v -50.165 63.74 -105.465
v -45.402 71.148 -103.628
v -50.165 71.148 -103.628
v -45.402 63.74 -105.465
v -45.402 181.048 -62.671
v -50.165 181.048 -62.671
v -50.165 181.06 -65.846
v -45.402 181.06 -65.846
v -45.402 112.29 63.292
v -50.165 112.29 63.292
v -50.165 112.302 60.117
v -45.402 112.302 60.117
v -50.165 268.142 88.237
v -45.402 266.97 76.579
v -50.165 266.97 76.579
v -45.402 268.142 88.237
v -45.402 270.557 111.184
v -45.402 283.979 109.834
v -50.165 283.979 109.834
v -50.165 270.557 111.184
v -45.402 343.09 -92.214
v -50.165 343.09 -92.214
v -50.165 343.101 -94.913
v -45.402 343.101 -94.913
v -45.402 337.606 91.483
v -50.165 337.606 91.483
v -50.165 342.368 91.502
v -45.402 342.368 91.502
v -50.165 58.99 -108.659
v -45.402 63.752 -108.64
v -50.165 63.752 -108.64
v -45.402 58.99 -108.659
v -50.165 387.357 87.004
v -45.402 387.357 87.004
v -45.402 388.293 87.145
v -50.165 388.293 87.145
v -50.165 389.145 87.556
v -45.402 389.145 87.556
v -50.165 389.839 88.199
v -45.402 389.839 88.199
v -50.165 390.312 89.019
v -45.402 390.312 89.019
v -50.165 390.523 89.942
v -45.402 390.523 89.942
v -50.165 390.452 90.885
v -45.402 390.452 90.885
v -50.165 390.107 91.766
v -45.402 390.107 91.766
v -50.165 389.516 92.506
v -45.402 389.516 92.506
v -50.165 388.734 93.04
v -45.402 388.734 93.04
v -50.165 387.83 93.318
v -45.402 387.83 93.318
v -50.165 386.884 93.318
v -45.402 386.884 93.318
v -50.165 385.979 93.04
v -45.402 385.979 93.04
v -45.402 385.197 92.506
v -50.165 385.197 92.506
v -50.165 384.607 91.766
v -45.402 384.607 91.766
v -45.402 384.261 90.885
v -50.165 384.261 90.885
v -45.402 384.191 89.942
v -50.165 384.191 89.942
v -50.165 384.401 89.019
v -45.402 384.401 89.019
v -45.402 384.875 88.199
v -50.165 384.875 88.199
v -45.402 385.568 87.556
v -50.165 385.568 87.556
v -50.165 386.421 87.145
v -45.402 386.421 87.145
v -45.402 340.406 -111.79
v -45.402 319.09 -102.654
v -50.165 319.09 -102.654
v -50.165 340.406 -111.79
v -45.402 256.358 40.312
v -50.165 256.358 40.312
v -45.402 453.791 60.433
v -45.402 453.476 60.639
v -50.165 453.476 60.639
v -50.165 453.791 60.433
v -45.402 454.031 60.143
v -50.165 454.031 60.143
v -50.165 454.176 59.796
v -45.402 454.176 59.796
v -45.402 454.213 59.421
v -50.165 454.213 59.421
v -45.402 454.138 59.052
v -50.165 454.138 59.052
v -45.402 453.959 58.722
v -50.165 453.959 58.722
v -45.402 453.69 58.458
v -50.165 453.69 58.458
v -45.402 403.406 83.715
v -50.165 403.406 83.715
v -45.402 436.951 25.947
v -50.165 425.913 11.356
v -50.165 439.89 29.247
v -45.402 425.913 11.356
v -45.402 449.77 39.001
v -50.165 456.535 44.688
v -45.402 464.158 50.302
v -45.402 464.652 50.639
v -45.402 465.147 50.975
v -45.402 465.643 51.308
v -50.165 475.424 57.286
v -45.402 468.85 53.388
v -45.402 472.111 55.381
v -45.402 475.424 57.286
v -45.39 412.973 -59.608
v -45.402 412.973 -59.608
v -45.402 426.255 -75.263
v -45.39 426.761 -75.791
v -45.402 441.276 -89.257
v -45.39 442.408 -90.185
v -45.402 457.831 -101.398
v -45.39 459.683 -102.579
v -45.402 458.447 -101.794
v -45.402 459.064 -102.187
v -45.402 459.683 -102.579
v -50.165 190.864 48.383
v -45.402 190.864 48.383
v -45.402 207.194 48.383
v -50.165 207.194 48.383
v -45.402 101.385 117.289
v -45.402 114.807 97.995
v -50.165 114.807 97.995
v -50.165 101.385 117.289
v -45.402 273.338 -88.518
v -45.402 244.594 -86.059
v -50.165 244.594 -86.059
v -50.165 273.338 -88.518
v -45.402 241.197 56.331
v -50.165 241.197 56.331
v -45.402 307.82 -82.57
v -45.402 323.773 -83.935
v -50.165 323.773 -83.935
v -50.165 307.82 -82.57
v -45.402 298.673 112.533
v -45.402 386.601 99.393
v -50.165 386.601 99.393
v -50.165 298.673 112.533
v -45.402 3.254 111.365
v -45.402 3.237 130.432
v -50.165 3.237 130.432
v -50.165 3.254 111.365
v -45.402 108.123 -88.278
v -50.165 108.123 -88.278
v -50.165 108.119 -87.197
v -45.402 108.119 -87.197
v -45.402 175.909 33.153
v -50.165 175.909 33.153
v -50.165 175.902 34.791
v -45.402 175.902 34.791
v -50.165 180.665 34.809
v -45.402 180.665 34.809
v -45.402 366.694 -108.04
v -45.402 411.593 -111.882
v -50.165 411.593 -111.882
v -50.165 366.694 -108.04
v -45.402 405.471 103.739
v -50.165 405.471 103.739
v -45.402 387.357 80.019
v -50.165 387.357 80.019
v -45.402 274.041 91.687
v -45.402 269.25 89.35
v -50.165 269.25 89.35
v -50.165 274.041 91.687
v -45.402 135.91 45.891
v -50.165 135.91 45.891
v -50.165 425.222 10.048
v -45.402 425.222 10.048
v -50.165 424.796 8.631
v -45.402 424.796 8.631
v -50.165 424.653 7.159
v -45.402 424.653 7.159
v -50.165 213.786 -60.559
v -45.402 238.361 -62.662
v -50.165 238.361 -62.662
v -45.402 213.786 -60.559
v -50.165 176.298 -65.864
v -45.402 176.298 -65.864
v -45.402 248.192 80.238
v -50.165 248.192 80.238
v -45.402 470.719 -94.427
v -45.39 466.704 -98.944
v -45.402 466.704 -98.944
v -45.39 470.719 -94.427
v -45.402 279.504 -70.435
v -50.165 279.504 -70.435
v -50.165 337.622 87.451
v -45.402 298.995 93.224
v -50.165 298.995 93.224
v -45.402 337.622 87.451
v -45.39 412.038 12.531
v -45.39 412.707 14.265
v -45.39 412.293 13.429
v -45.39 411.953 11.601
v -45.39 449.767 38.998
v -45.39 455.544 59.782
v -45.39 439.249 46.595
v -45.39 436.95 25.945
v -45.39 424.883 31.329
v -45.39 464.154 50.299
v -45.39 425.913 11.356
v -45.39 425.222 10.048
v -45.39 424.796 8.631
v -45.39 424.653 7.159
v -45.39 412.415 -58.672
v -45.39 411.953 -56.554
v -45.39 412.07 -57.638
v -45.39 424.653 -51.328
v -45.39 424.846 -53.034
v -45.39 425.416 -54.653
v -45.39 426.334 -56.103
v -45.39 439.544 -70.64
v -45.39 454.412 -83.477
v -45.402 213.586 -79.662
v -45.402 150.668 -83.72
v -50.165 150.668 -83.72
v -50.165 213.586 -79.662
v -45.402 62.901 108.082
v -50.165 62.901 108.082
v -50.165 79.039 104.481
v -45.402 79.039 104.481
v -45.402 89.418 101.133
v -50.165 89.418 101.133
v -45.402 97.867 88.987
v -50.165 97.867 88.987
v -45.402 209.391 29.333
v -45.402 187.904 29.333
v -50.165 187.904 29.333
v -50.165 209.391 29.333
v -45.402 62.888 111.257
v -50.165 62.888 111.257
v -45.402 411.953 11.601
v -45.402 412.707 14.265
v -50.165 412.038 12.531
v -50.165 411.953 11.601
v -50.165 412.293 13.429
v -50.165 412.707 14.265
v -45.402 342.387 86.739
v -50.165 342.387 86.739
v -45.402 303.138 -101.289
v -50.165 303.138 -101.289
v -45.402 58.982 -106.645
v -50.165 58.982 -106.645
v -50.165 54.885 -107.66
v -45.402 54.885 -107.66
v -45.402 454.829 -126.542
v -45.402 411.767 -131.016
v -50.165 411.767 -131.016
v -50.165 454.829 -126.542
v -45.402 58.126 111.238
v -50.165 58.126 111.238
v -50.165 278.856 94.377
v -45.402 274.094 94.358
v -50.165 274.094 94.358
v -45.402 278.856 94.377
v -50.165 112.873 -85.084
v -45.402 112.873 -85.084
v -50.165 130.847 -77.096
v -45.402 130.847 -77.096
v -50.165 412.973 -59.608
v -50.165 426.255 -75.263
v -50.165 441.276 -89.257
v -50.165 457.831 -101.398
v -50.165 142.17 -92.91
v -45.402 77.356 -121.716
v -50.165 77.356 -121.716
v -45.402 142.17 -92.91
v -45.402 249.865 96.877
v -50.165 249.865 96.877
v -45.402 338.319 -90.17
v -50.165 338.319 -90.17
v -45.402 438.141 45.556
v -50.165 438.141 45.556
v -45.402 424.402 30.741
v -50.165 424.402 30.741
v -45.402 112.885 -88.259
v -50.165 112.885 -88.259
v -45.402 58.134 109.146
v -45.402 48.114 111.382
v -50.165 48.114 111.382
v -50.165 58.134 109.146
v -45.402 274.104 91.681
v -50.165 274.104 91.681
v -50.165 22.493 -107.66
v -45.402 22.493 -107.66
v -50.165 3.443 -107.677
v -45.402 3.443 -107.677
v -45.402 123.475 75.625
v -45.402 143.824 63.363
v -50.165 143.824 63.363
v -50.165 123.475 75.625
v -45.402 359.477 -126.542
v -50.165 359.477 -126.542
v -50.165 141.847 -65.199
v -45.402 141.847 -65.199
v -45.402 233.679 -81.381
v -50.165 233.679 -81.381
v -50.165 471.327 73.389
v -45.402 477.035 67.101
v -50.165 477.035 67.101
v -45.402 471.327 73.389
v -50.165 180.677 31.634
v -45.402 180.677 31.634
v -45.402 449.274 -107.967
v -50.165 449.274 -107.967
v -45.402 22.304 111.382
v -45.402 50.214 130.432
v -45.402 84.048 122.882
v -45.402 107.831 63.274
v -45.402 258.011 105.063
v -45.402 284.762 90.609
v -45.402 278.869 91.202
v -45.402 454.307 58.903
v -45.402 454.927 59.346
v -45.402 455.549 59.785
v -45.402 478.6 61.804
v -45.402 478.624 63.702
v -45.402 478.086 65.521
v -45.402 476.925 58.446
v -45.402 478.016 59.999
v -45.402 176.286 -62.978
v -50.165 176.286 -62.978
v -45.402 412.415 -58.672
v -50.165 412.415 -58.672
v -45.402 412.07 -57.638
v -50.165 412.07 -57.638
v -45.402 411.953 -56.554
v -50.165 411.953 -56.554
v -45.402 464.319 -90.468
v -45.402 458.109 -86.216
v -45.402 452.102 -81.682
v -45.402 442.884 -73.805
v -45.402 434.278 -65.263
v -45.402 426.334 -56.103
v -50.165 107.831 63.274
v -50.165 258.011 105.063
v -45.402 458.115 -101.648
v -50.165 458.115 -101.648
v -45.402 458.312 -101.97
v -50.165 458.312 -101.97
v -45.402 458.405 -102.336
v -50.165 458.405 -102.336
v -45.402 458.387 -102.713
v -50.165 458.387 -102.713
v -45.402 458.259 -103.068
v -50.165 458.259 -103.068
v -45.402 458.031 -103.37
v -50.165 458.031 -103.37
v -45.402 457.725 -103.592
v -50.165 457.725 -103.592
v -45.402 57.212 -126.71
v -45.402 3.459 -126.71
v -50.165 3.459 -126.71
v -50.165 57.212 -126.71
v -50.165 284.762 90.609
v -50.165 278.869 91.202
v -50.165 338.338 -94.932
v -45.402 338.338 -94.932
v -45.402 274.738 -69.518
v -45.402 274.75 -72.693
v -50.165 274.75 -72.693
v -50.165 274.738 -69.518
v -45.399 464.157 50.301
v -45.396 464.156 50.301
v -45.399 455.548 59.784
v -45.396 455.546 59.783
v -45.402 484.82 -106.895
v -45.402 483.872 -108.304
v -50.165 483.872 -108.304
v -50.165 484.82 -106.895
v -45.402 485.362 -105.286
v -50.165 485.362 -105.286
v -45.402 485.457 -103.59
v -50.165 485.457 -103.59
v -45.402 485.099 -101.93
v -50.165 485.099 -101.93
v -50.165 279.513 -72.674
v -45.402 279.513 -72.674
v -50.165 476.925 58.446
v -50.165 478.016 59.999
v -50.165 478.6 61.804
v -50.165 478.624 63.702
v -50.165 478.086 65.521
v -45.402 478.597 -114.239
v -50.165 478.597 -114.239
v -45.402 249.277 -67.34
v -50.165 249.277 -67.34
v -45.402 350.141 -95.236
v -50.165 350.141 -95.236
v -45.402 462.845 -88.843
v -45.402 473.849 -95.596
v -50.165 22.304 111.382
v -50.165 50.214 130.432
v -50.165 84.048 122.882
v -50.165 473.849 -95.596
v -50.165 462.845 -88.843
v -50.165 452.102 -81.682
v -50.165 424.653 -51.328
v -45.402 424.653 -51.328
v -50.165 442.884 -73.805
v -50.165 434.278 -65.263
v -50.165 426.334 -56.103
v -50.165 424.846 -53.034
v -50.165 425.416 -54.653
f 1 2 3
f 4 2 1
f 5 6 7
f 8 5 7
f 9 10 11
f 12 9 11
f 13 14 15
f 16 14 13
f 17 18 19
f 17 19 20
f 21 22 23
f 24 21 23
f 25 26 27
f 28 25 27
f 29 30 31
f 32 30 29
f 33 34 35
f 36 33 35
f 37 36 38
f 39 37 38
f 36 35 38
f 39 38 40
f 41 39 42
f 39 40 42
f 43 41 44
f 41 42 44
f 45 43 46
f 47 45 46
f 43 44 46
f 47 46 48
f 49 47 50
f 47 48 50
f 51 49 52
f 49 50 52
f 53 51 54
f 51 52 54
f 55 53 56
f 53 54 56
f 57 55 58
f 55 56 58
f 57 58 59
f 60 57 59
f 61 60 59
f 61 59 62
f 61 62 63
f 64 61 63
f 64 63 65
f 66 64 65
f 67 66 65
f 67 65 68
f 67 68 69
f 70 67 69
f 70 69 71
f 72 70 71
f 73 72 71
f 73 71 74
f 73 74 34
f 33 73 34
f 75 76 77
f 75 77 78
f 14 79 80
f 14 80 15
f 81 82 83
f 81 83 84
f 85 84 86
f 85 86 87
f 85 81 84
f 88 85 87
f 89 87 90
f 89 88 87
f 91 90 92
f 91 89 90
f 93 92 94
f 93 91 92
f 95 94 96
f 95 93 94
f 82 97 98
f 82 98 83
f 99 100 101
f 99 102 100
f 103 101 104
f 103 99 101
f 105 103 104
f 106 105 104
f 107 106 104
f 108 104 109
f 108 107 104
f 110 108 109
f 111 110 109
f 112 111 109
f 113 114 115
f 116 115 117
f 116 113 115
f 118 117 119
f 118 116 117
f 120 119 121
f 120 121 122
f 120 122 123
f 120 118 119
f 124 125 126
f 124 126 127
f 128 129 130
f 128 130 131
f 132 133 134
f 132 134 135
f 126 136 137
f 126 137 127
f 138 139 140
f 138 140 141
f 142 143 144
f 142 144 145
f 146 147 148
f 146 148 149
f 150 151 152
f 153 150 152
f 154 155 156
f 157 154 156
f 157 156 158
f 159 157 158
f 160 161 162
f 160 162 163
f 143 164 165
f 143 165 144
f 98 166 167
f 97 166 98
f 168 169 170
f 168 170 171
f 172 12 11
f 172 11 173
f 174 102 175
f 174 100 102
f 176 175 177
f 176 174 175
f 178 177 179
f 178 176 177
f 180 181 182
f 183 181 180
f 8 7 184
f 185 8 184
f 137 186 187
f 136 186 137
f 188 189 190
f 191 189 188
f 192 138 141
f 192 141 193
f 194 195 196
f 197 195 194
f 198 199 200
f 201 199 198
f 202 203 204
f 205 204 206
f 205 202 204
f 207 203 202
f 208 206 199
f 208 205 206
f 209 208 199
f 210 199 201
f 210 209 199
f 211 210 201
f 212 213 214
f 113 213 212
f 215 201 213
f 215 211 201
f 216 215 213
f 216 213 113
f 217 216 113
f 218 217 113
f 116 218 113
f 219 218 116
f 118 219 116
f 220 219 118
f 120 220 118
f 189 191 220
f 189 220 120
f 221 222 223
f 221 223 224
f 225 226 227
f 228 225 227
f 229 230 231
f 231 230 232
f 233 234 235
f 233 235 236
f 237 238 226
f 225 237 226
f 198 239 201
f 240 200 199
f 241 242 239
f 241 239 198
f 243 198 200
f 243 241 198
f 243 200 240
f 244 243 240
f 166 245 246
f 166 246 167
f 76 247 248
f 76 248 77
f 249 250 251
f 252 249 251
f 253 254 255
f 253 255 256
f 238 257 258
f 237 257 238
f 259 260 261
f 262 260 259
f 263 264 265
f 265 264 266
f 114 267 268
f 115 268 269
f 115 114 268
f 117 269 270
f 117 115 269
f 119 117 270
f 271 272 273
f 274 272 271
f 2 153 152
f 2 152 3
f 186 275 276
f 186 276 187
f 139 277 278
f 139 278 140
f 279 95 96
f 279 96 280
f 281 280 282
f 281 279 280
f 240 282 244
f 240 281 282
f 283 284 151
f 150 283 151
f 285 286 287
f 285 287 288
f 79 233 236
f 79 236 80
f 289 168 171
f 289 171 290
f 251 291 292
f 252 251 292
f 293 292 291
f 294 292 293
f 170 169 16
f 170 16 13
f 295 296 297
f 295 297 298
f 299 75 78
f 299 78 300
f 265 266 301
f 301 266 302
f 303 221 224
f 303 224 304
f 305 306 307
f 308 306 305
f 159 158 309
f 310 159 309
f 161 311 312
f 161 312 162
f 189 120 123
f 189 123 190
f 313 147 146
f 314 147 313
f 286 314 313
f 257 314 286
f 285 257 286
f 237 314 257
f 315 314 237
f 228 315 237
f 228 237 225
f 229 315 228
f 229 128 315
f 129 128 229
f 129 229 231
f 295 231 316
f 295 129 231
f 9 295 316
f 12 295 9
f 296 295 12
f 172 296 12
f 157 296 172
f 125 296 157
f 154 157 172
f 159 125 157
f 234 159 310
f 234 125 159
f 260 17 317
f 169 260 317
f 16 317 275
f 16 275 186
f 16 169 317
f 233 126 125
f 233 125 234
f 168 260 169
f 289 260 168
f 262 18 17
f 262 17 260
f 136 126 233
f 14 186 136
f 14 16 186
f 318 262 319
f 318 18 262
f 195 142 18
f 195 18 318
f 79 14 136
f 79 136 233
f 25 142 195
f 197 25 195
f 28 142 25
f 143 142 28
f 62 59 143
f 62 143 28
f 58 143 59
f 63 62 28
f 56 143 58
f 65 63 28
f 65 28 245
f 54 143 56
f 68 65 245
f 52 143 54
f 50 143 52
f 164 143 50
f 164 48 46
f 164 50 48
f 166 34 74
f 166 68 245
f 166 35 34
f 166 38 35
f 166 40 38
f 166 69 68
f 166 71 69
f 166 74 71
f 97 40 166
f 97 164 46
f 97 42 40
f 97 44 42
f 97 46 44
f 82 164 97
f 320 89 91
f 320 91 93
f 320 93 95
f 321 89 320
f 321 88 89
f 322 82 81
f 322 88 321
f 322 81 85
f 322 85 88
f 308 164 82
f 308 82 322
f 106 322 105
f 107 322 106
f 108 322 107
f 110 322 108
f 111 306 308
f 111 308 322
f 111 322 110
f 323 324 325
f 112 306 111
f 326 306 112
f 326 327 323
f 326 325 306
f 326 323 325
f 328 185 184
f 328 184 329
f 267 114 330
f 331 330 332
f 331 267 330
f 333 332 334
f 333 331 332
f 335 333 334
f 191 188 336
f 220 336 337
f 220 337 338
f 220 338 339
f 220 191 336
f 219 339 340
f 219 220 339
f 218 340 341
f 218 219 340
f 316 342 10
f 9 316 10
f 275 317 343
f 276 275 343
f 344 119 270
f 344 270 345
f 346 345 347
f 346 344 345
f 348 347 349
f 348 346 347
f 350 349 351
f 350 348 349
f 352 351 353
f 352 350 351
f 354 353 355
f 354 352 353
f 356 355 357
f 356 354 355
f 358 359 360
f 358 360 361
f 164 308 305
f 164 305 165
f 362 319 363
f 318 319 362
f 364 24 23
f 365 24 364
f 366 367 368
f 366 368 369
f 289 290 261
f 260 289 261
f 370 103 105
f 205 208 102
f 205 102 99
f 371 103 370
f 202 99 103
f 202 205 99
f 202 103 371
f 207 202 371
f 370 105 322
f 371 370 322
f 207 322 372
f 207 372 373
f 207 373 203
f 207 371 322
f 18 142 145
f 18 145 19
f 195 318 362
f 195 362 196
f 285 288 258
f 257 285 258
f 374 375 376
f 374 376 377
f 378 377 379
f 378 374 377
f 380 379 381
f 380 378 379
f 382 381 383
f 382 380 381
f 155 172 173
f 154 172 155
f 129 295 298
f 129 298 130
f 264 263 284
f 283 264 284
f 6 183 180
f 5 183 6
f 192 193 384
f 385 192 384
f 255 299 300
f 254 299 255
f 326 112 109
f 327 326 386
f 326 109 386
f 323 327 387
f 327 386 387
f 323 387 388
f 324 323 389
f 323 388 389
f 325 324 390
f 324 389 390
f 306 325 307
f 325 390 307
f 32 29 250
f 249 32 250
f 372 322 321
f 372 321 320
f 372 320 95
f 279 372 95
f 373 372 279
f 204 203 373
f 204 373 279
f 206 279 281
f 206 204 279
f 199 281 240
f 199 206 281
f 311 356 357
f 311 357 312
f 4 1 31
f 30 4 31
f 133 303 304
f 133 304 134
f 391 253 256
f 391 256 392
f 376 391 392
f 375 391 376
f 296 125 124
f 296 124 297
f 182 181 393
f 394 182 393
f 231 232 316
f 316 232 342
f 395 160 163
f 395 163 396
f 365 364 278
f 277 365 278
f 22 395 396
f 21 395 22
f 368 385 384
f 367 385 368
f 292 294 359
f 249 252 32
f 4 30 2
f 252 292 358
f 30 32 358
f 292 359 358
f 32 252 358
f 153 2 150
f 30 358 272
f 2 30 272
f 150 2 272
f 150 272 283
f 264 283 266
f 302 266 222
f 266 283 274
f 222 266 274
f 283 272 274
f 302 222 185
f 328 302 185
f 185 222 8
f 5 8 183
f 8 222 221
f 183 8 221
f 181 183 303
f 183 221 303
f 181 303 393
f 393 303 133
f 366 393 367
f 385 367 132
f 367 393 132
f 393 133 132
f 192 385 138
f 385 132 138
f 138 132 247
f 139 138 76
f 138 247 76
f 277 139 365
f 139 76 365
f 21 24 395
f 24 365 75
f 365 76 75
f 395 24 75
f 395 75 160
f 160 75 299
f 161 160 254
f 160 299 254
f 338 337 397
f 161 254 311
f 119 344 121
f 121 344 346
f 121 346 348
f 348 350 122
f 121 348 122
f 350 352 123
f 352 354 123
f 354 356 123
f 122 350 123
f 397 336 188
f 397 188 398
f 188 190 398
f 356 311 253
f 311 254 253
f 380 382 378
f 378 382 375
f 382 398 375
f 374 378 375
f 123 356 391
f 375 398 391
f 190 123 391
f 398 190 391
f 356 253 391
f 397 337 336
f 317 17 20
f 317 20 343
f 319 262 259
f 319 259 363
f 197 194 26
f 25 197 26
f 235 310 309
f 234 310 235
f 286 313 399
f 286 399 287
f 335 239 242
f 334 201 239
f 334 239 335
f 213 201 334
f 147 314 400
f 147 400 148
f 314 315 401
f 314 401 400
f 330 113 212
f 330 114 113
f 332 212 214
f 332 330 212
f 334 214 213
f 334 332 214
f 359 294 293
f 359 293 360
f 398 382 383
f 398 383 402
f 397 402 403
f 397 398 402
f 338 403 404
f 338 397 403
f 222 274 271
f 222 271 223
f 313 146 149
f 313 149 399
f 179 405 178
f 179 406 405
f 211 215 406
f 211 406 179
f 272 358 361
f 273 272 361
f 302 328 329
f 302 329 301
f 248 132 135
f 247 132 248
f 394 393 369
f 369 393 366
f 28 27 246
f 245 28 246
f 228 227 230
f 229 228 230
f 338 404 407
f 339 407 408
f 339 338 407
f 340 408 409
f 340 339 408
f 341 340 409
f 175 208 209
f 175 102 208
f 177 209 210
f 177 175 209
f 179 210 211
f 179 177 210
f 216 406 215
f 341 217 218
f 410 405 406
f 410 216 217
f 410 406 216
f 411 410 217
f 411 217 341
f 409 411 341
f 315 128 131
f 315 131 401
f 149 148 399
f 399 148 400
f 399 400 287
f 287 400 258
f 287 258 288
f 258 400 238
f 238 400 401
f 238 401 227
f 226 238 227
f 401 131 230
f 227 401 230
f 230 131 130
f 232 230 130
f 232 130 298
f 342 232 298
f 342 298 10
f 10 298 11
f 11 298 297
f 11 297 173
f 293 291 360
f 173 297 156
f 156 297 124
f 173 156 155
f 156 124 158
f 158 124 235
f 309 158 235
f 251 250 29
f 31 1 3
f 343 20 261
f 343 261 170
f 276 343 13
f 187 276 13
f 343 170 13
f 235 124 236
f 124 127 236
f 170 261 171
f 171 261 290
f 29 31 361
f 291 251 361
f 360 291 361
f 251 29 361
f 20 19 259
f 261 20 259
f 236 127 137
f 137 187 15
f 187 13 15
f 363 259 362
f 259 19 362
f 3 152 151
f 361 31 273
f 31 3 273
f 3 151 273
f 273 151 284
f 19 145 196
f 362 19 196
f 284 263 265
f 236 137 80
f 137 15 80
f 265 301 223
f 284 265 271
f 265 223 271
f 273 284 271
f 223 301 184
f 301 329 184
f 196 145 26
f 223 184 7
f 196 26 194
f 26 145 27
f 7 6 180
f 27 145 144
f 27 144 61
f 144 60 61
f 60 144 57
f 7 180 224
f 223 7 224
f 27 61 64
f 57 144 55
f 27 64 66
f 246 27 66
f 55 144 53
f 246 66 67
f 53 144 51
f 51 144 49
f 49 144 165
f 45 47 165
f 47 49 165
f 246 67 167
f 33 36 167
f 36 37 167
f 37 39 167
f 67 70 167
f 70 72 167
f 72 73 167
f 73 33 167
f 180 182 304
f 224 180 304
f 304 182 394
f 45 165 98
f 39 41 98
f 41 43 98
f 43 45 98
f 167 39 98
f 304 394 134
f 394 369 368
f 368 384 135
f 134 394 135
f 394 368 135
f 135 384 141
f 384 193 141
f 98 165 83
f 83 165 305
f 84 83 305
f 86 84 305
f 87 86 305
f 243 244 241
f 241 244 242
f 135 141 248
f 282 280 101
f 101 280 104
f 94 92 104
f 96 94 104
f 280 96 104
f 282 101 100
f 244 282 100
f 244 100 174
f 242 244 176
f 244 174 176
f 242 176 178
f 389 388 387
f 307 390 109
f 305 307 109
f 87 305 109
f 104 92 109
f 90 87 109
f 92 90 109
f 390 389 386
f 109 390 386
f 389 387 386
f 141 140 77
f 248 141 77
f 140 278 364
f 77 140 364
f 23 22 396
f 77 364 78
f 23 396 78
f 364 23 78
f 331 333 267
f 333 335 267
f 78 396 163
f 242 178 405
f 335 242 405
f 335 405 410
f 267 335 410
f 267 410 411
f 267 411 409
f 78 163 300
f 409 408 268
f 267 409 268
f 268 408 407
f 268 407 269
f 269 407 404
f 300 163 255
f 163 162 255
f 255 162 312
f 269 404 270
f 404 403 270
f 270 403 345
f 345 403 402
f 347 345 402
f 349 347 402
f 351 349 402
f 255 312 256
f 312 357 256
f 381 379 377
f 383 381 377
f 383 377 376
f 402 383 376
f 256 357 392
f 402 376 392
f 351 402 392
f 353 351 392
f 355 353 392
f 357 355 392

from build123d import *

# Parameters (mm, degrees)
BOSS_EXTRUDE1_DEPTH = 0.0127
BOSS_EXTRUDE2_DEPTH = 4.7625
CUT_EXTRUDE1_DEPTH  = 503.866877
CUT_EXTRUDE2_DEPTH  = 503.866877
CUT_EXTRUDE3_DEPTH  = 503.866877
CUT_EXTRUDE4_DEPTH  = 503.866756562
CUT_EXTRUDE5_DEPTH  = 503.866756562
DRAFT1_ANGLE        = -23.423733099
DRAFT2_ANGLE        = 5.115544643
DRAFT3_ANGLE        = -5.967888323
DRAFT4_ANGLE        = 5.967888323
DRAFT5_ANGLE        = 23.737346389
DRAFT6_ANGLE        = 13.699700153
DRAFT7_ANGLE        = 20.956206915
DRAFT8_ANGLE        = -0.049454377
DRAFT9_ANGLE        = 3.465221439
DRAFT10_ANGLE       = -3.465221439
DRAFT11_START       = -117
DRAFT11_OUTLINE_W   = 4.7625
DRAFT11_OUTLINE_H   = 32.392406503
DRAFT11_DEPTH       = 9.339519007
DRAFT12_ANGLE       = 0.049454377
CHAMFER1_SIZE       = 0.605241869
CHAMFER1_SIZE2      = 1.164909596
CHAMFER2_SIZE       = 9.670928998
CHAMFER2_SIZE2      = 7.254566107
CHAMFER3_SIZE       = 4.192230568
CHAMFER3_SIZE_2     = 1.781251189
CHAMFER4_SIZE       = 8.568336776
CHAMFER4_SIZE2      = 4.451775644
CHAMFER5_SIZE       = 8.906910487
CHAMFER5_SIZE2      = 12.297746559
FILLET1_R           = 5.08
FILLET2_R           = 6.35
FILLET3_R           = 7.62
SKETCH8_R           = 3.175
CUT_EXTRUDE6_DEPTH  = 503.866756562


with BuildPart() as part:
    # Sketch1 → Boss-Extrude1 (new body)
    with BuildSketch(Plane(origin=(-45.3898, 0, 0), x_dir=(0, 0, -1), z_dir=(1, 0, 0))):
        with BuildLine():
            Line((-13.027117867, 411.952661405), (58.2376066, 411.952661405))
            ThreePointArc((58.2376066, 411.952661405), (82.645894032, 433.738757071), (102.578592504, 459.682657922))
            Line((102.578592504, 459.682657922), (98.943932202, 466.704160778))
            Line((98.943932202, 466.704160778), (94.427076157, 470.71914393))
            ThreePointArc((94.427076157, 470.71914393), (76.393067454, 445.761223724), (53.975399251, 424.652661405))
            Line((53.975399251, 424.652661405), (-9.412118588, 424.652661405))
            ThreePointArc((-9.412118588, 424.652661405), (-32.493316198, 442.967669513), (-51.307892988, 465.643491556))
            Line((-51.307892988, 465.643491556), (-60.806367703, 457.019876355))
            ThreePointArc((-60.806367703, 457.019876355), (-39.331205359, 431.926509848), (-13.027117867, 411.952661405))
        make_face()
    extrude(amount=-BOSS_EXTRUDE1_DEPTH)

    # Sketch2 → Boss-Extrude2 (add)
    with BuildSketch(Plane.ZY.offset(45.4025)):
        with BuildLine():
            Line((63.098500001, 63.077602974), (63.291879008, 112.289723034))
            Line((63.291879008, 112.289723034), (60.11690352, 112.302199099))
            Line((60.11690352, 112.302199099), (45.891151151, 135.910086956))
            Line((45.891151151, 135.910086956), (29.332811414, 187.904334246))
            Line((29.332811414, 187.904334246), (29.332811414, 209.391021623))
            Line((29.332811414, 209.391021623), (40.312142586, 256.358160528))
            Line((40.312142586, 256.358160528), (76.579075699, 266.969790755))
            Line((76.579075699, 266.969790755), (88.839020466, 268.202734319))
            Line((88.839020466, 268.202734319), (91.680534506, 274.027275603))
            Line((91.680534506, 274.027275603), (91.68083764, 274.104418767))
            Line((91.68083764, 274.104418767), (94.357956542, 274.093899029))
            Line((94.357956542, 274.093899029), (94.37667064, 278.856362261))
            Line((94.37667064, 278.856362261), (91.201695152, 278.868838325))
            Line((91.201695152, 278.868838325), (91.238314866, 288.188018226))
            Line((91.238314866, 288.188018226), (93.223805533, 298.995347166))
            Line((93.223805533, 298.995347166), (80.018928963, 387.356885758))
            Line((80.018928963, 387.356885758), (83.715153611, 403.40626313))
            Line((83.715153611, 403.40626313), (60.639482355, 453.476115857))
            ThreePointArc((60.639482355, 453.476115857), (59.610055268, 454.208482516), (58.457946256, 453.690094752))
            ThreePointArc((58.457946256, 453.690094752), (37.83997486, 430.538330076), (13.027117867, 411.952661405))
            Line((13.027117867, 411.952661405), (-58.2376066, 411.952661405))
            ThreePointArc((-58.2376066, 411.952661405), (-81.896078346, 432.936686808), (-101.39751725, 457.831394844))
            ThreePointArc((-101.39751725, 457.831394844), (-102.525122265, 458.410155941), (-103.591729488, 457.725461477))
            Line((-103.591729488, 457.725461477), (-107.966767627, 449.273683253))
            Line((-107.966767627, 449.273683253), (-111.881642193, 411.593015556))
            Line((-111.881642193, 411.593015556), (-108.039976128, 366.693543428))
            Line((-108.039976128, 366.693543428), (-92.201907276, 346.218638937))
            Line((-92.201907276, 346.218638937), (-92.214201021, 343.09006127))
            Line((-92.214201021, 343.09006127), (-94.913419834, 343.100667849))
            Line((-94.913419834, 343.100667849), (-94.932133931, 338.338204617))
            Line((-94.932133931, 338.338204617), (-90.1696707, 338.31949052))
            Line((-90.1696707, 338.31949052), (-83.935257282, 323.772525879))
            Line((-83.935257282, 323.772525879), (-82.57036198, 307.820312032))
            Line((-82.57036198, 307.820312032), (-70.434794903, 279.503988853))
            Line((-70.434794903, 279.503988853), (-72.674480904, 279.512789698))
            Line((-72.674480904, 279.512789698), (-72.693195002, 274.750326466))
            Line((-72.693195002, 274.750326466), (-65.772846516, 274.72313296))
            Line((-65.772846516, 274.72313296), (-62.454891666, 235.944535654))
            Line((-62.454891666, 235.944535654), (-62.670608684, 181.0477196))
            Line((-62.670608684, 181.0477196), (-65.845584172, 181.060195665))
            Line((-65.845584172, 181.060195665), (-65.86429827, 176.297732434))
            Line((-65.86429827, 176.297732434), (-62.977705988, 176.28638957))
            Line((-62.977705988, 176.28638957), (-63.227227287, 112.786879815))
            Line((-63.227227287, 112.786879815), (-88.259006751, 112.885242183))
            Line((-88.259006751, 112.885242183), (-88.277720849, 108.122778952))
            Line((-88.277720849, 108.122778952), (-87.197024048, 108.118532354))
            Line((-87.197024048, 108.118532354), (-105.452076716, 67.044663851))
            Line((-105.452076716, 67.044663851), (-105.465062496, 63.73997343))
            Line((-105.465062496, 63.73997343), (-108.640037983, 63.752449495))
            Line((-108.640037983, 63.752449495), (-108.658752081, 58.989986263))
            Line((-108.658752081, 58.989986263), (-106.644713581, 58.9820721))
            Line((-106.644713581, 58.9820721), (-115.689979538, 22.499688915))
            Line((-115.689979538, 22.499688915), (-107.660480993, 22.492758318))
            Line((-107.660480993, 22.492758318), (-107.67690966, 3.459194076))
            Line((-107.67690966, 3.459194076), (-126.710480993, 3.459194076))
            Line((-126.710480993, 3.459194076), (-126.710480993, 66.118439508))
            Line((-126.710480993, 66.118439508), (-92.909897604, 142.169752132))
            Line((-92.909897604, 142.169752132), (-83.719650595, 150.6676735))
            Line((-83.719650595, 150.6676735), (-79.661502452, 213.586437078))
            Line((-79.661502452, 213.586437078), (-81.380621848, 233.678645015))
            Line((-81.380621848, 233.678645015), (-86.058679342, 244.5941125))
            Line((-86.058679342, 244.5941125), (-88.518059029, 273.338112591))
            Line((-88.518059029, 273.338112591), (-101.28931463, 303.137708994))
            Line((-101.28931463, 303.137708994), (-102.654209933, 319.089922841))
            Line((-102.654209933, 319.089922841), (-111.78950274, 340.405606059))
            Line((-111.78950274, 340.405606059), (-126.542147774, 359.477312393))
            Line((-126.542147774, 359.477312393), (-131.016120376, 411.766867185))
            Line((-131.016120376, 411.766867185), (-126.542147774, 454.828853484))
            Line((-126.542147774, 454.828853484), (-114.238723117, 478.596832935))
            Line((-114.238723117, 478.596832935), (-108.303962247, 483.87217593))
            ThreePointArc((-108.303962247, 483.87217593), (-105.285823641, 485.361600068), (-101.930416001, 485.099332124))
            ThreePointArc((-101.930416001, 485.099332124), (-92.271078374, 468.315288335), (-81.681786038, 452.101904447))
            ThreePointArc((-81.681786038, 452.101904447), (-68.654979704, 437.543154295), (-53.975399251, 424.652661405))
            Line((-53.975399251, 424.652661405), (9.412118588, 424.652661405))
            ThreePointArc((9.412118588, 424.652661405), (39.230903664, 450.027897644), (61.005482484, 482.569106517))
            Line((61.005482484, 482.569106517), (73.3885029, 471.326627455))
            Line((73.3885029, 471.326627455), (103.739348885, 405.471018242))
            Line((103.739348885, 405.471018242), (99.393468652, 386.600771296))
            Line((99.393468652, 386.600771296), (112.533469465, 298.673354268))
            Line((112.533469465, 298.673354268), (109.833870487, 283.979024727))
            Line((109.833870487, 283.979024727), (111.183669976, 270.557106919))
            Line((111.183669976, 270.557106919), (101.306292113, 250.310437595))
            Line((101.306292113, 250.310437595), (80.238035837, 248.191670221))
            Line((80.238035837, 248.191670221), (56.331482353, 241.196661715))
            Line((56.331482353, 241.196661715), (46.181423967, 197.776967512))
            Line((46.181423967, 197.776967512), (63.363434196, 143.824354935))
            Line((63.363434196, 143.824354935), (75.625489201, 123.475257613))
            Line((75.625489201, 123.475257613), (97.995352213, 114.806935695))
            Line((97.995352213, 114.806935695), (117.289359061, 101.385017888))
            Line((117.289359061, 101.385017888), (122.881824815, 84.048374053))
            Line((122.881824815, 84.048374053), (130.431653581, 50.213956247))
            Line((130.431653581, 50.213956247), (130.431653581, 3.237243921))
            Line((130.431653581, 3.237243921), (111.365196529, 3.237243921))
            Line((111.365196529, 3.237243921), (111.381653581, 22.303693871))
            Line((111.381653581, 22.303693871), (111.381653581, 48.114361138))
            Line((111.381653581, 48.114361138), (109.145838905, 58.134123205))
            Line((109.145838905, 58.134123205), (111.238452841, 58.125900279))
            Line((111.238452841, 58.125900279), (111.257166938, 62.888363511))
            Line((111.257166938, 62.888363511), (63.098500001, 63.077602974))
        make_face()
    extrude(amount=BOSS_EXTRUDE2_DEPTH)

    # Sketch3 → Cut-Extrude1 (cut, through all)
    with BuildSketch(Plane.ZY.offset(50.165)):
        Polygon((108.082191451, 62.900839576), (104.481099005, 79.039068683), (101.133017225, 89.418122202), (74.729088783, 107.786072422), (63.274358787, 107.831083779), (63.098500001, 63.077602974), align=None)
    extrude(amount=-CUT_EXTRUDE1_DEPTH, mode=Mode.SUBTRACT)

    # Sketch4 → Cut-Extrude2 (cut, through all)
    with BuildSketch(Plane.ZY.offset(50.165)):
        Polygon((33.153017032, 175.90864393), (34.790677515, 175.902208744), (34.809391613, 180.664671975), (31.634416125, 180.67714804), align=None)
    extrude(amount=-CUT_EXTRUDE2_DEPTH, mode=Mode.SUBTRACT)

    # Sketch5 → Cut-Extrude3 (cut, through all)
    with BuildSketch(Plane.ZY.offset(50.165)):
        Polygon((87.451452952, 337.621528381), (91.48306349, 337.605686169), (91.501777588, 342.3681494), (86.739314356, 342.386863498), align=None)
    extrude(amount=-CUT_EXTRUDE3_DEPTH, mode=Mode.SUBTRACT)

    # Sketch6 → Cut-Extrude4 (cut, through all)
    with BuildSketch(Plane(origin=(-45.4025, 0, 0), x_dir=(0, 0, -1), z_dir=(1, 0, 0))):
        Polygon((85.084031263, 112.872766118), (85.042276171, 123.498824601), (63.105427604, 143.78311228), (63.227227287, 112.786879815), align=None)
    extrude(amount=-CUT_EXTRUDE4_DEPTH, mode=Mode.SUBTRACT)

    # Sketch7 → Cut-Extrude5 (cut, through all)
    with BuildSketch(Plane(origin=(-45.4025, 0, 0), x_dir=(0, 0, -1), z_dir=(1, 0, 0))):
        Polygon((65.772846516, 274.72313296), (62.661669198, 238.361248053), (69.597567272, 254.545010226), (69.518219514, 274.737850401), align=None)
    extrude(amount=-CUT_EXTRUDE5_DEPTH, mode=Mode.SUBTRACT)

    # Draft1
    draft1_faces = [part.faces().sort_by_distance(p)[0] for p in [
        (-47.78375, 344.654350103, -92.208054149),
    ]]
    draft(draft1_faces, Plane(origin=(-50.165, 343.09006127, -92.214201021), x_dir=(0, 0.003929469288600158, -0.9999922796057528), z_dir=(0, -0.9999922796057528, -0.003929469288600158)), DRAFT1_ANGLE)

    # Draft2
    draft2_faces = [part.faces().sort_by_distance(p)[0] for p in [
        (-47.78375, 264.641430314, -69.557893393),
    ]]
    draft(draft2_faces, Plane(origin=(-50.165, 274.750326466, -72.693195002), x_dir=(0, -0.003929469288469372, 0.9999922796057533), z_dir=(0, 0.9999922796057533, 0.003929469288469372)), DRAFT2_ANGLE)

    # Draft3
    draft3_faces = [part.faces().sort_by_distance(p)[0] for p in [
        (-47.78375, 274.065847185, 91.680686073),
    ]]
    draft(draft3_faces, Plane(origin=(-50.165, 274.104418767, 91.68083764), x_dir=(0, -0.003929469288490345, 0.9999922796057532), z_dir=(0, 0.9999922796057532, 0.003929469288490345)), DRAFT3_ANGLE)

    # Draft4
    draft4_faces = [part.faces().sort_by_distance(p)[0] for p in [
        (-47.78375, 283.528428276, 91.220005009),
    ]]
    draft(draft4_faces, Plane(origin=(-50.165, 278.856362261, 94.37667064), x_dir=(0, 0.003929469288483807, -0.9999922796057532), z_dir=(0, -0.9999922796057532, -0.003929469288483807)), DRAFT4_ANGLE)

    # Draft5
    draft5_faces = [part.faces().sort_by_distance(p)[0] for p in [
        (-47.78375, 118.185795359, -85.063153717),
    ]]
    draft(draft5_faces, Plane(origin=(-50.165, 112.786879815, -63.227227287), x_dir=(0, 0.003929469288636028, -0.9999922796057527), z_dir=(0, -0.9999922796057527, -0.003929469288636028)), DRAFT5_ANGLE)

    # Draft6
    draft6_faces = [part.faces().sort_by_distance(p)[0] for p in [
        (-47.78375, 65.39231864, -105.458569606),
    ]]
    draft(draft6_faces, Plane(origin=(-50.165, 63.73997343, -105.465062496), x_dir=(0, 0.003929469288638521, -0.9999922796057527), z_dir=(0, -0.9999922796057527, -0.003929469288638521)), DRAFT6_ANGLE)

    # Draft7
    draft7_faces = [part.faces().sort_by_distance(p)[0] for p in [
        (-47.78375, 107.808578101, 69.001723785),
    ]]
    draft(draft7_faces, Plane(origin=(-50.165, 63.077602974, 63.098500001), x_dir=(0, -0.9999922796057527, -0.00392946928863582), z_dir=(0, 0.00392946928863582, -0.9999922796057527)), DRAFT7_ANGLE)

    # Draft8
    draft8_faces = [part.faces().sort_by_distance(p)[0] for p in [
        (-47.78375, 3.237243921, 120.898425055),
    ]]
    draft(draft8_faces, Plane(origin=(-50.165, 50.213956247, 130.431653581), x_dir=(1, 0, 0), z_dir=(0, 0, 1)), DRAFT8_ANGLE)

    # Draft9
    draft9_faces = [part.faces().sort_by_distance(p)[0] for p in [
        (-47.78375, 208.496127627, -62.562750175),
    ]]
    draft(draft9_faces, Plane(origin=(-50.165, 181.0477196, -62.670608684), x_dir=(0, 0.0039294692886257, -0.9999922796057527), z_dir=(0, -0.9999922796057527, -0.0039294692886257)), DRAFT9_ANGLE)

    # Draft10
    draft10_faces = [part.faces().sort_by_distance(p)[0] for p in [
        (-47.78375, 160.034750925, -63.041566796),
    ]]
    draft(draft10_faces, Plane(origin=(-50.165, 176.297732434, -65.86429827), x_dir=(0, -0.003929469288640679, 0.9999922796057527), z_dir=(0, 0.9999922796057527, 0.003929469288640679)), DRAFT10_ANGLE)

    # Draft11: read off the stored shape, not the designer's step
    # Draft11 outline → Draft11 (add)
    with BuildSketch(Plane.XY.offset(DRAFT11_START)):
        with Locations((-47.78375, 38.68896157)):
            Rectangle(DRAFT11_OUTLINE_W, DRAFT11_OUTLINE_H)
    extrude(amount=DRAFT11_DEPTH)

    # Draft12
    draft12_faces = [part.faces().sort_by_distance(p)[0] for p in [
        (-47.78375, 3.459194076, -117.193695326),
    ]]
    draft(draft12_faces, Plane(origin=(-50.165, 3.459194076, -126.710480993), x_dir=(0, -1, 0), z_dir=(0, 0, -1)), DRAFT12_ANGLE)

    # Chamfer1
    chamfer1_edges = [part.edges().sort_by_distance(p)[0] for p in [
        (-47.78375, 268.202734319, 88.839020466),
    ]]
    chamfer1_side = [part.faces().sort_by_distance(p)[0] for p in [
        (-47.78375, 267.586262537, 82.709048083),
    ]]
    chamfer(chamfer1_edges, length=CHAMFER1_SIZE, length2=CHAMFER1_SIZE2, reference=chamfer1_side[0])

    # Chamfer2
    chamfer2_edges = [part.edges().sort_by_distance(p)[0] for p in [
        (-47.78375, 197.776967512, 46.181423967),
    ]]
    chamfer2_side = [part.faces().sort_by_distance(p)[0] for p in [
        (-47.78375, 219.486814614, 51.25645316),
    ]]
    chamfer(chamfer2_edges, length=CHAMFER2_SIZE, length2=CHAMFER2_SIZE2, reference=chamfer2_side[0])

    # Chamfer3
    # the kernel refuses this chamfer: 4.192230568, 1.908890983, 1.781251189, 1.693531442 mm, written as the material it takes off along each edge
    with BuildSketch(Plane(origin=(-45.3898, 472.948594066, 43.261693123), x_dir=(-1, 0, 0), z_dir=(0, -0.6721877610222942, 0.7403807222853895))) as chamfer3_piece_1_section:
        Polygon((CHAMFER3_SIZE, 0), (0, CHAMFER3_SIZE_2), (0, 0), align=None)
    chamfer3_piece_1 = extrude(amount=34.564479699, mode=Mode.PRIVATE)
    chamfer3_piece_1 = split(chamfer3_piece_1, bisect_by=Plane(origin=(-45.4025, 472.948594066, 43.261693123), z_dir=(1, 0, 0)), keep=Keep.TOP, mode=Mode.PRIVATE)
    add(chamfer3_piece_1, mode=Mode.SUBTRACT)

    # Chamfer4
    chamfer4_edges = [part.edges().sort_by_distance(p)[0] for p in [
        (-47.78375, 250.310437595, 101.306292113),
    ]]
    chamfer4_side = [part.faces().sort_by_distance(p)[0] for p in [
        (-47.78375, 260.433772257, 106.244981045),
    ]]
    chamfer(chamfer4_edges, length=CHAMFER4_SIZE, length2=CHAMFER4_SIZE2, reference=chamfer4_side[0])

    # Chamfer5
    chamfer5_edges = [part.edges().sort_by_distance(p)[0] for p in [
        (-47.78375, 66.118439508, -126.710480993),
    ]]
    chamfer5_side = [part.faces().sort_by_distance(p)[0] for p in [
        (-47.78375, 34.788816792, -126.710480993),
    ]]
    chamfer(chamfer5_edges, length=CHAMFER5_SIZE, length2=CHAMFER5_SIZE2, reference=chamfer5_side[0])

    # Fillet1
    fillet1_edges = [part.edges().sort_by_distance(p)[0] for p in [
        (-47.7774, 411.952661405, -58.2376066),
        (-47.7774, 411.952661405, 13.027117867),
    ]]
    fillet(fillet1_edges, radius=FILLET1_R)

    # Fillet2
    fillet2_edges = [part.edges().sort_by_distance(p)[0] for p in [
        (-47.78375, 482.569106517, 61.005482484),
    ]]
    fillet(fillet2_edges, radius=FILLET2_R)

    # Fillet3
    fillet3_edges = [part.edges().sort_by_distance(p)[0] for p in [
        (-47.7774, 424.652661405, 9.412118588),
        (-47.7774, 424.652661405, -53.975399251),
    ]]
    fillet(fillet3_edges, radius=FILLET3_R)

    # Sketch8 → Cut-Extrude6 (cut, through all)
    with BuildSketch(Plane(origin=(-45.4025, 0, 0), x_dir=(0, 0, -1), z_dir=(1, 0, 0))):
        with Locations((-90.178928963, 387.356885758)):
            Circle(SKETCH8_R)
    extrude(amount=-CUT_EXTRUDE6_DEPTH, mode=Mode.SUBTRACT)


solid = part.part
